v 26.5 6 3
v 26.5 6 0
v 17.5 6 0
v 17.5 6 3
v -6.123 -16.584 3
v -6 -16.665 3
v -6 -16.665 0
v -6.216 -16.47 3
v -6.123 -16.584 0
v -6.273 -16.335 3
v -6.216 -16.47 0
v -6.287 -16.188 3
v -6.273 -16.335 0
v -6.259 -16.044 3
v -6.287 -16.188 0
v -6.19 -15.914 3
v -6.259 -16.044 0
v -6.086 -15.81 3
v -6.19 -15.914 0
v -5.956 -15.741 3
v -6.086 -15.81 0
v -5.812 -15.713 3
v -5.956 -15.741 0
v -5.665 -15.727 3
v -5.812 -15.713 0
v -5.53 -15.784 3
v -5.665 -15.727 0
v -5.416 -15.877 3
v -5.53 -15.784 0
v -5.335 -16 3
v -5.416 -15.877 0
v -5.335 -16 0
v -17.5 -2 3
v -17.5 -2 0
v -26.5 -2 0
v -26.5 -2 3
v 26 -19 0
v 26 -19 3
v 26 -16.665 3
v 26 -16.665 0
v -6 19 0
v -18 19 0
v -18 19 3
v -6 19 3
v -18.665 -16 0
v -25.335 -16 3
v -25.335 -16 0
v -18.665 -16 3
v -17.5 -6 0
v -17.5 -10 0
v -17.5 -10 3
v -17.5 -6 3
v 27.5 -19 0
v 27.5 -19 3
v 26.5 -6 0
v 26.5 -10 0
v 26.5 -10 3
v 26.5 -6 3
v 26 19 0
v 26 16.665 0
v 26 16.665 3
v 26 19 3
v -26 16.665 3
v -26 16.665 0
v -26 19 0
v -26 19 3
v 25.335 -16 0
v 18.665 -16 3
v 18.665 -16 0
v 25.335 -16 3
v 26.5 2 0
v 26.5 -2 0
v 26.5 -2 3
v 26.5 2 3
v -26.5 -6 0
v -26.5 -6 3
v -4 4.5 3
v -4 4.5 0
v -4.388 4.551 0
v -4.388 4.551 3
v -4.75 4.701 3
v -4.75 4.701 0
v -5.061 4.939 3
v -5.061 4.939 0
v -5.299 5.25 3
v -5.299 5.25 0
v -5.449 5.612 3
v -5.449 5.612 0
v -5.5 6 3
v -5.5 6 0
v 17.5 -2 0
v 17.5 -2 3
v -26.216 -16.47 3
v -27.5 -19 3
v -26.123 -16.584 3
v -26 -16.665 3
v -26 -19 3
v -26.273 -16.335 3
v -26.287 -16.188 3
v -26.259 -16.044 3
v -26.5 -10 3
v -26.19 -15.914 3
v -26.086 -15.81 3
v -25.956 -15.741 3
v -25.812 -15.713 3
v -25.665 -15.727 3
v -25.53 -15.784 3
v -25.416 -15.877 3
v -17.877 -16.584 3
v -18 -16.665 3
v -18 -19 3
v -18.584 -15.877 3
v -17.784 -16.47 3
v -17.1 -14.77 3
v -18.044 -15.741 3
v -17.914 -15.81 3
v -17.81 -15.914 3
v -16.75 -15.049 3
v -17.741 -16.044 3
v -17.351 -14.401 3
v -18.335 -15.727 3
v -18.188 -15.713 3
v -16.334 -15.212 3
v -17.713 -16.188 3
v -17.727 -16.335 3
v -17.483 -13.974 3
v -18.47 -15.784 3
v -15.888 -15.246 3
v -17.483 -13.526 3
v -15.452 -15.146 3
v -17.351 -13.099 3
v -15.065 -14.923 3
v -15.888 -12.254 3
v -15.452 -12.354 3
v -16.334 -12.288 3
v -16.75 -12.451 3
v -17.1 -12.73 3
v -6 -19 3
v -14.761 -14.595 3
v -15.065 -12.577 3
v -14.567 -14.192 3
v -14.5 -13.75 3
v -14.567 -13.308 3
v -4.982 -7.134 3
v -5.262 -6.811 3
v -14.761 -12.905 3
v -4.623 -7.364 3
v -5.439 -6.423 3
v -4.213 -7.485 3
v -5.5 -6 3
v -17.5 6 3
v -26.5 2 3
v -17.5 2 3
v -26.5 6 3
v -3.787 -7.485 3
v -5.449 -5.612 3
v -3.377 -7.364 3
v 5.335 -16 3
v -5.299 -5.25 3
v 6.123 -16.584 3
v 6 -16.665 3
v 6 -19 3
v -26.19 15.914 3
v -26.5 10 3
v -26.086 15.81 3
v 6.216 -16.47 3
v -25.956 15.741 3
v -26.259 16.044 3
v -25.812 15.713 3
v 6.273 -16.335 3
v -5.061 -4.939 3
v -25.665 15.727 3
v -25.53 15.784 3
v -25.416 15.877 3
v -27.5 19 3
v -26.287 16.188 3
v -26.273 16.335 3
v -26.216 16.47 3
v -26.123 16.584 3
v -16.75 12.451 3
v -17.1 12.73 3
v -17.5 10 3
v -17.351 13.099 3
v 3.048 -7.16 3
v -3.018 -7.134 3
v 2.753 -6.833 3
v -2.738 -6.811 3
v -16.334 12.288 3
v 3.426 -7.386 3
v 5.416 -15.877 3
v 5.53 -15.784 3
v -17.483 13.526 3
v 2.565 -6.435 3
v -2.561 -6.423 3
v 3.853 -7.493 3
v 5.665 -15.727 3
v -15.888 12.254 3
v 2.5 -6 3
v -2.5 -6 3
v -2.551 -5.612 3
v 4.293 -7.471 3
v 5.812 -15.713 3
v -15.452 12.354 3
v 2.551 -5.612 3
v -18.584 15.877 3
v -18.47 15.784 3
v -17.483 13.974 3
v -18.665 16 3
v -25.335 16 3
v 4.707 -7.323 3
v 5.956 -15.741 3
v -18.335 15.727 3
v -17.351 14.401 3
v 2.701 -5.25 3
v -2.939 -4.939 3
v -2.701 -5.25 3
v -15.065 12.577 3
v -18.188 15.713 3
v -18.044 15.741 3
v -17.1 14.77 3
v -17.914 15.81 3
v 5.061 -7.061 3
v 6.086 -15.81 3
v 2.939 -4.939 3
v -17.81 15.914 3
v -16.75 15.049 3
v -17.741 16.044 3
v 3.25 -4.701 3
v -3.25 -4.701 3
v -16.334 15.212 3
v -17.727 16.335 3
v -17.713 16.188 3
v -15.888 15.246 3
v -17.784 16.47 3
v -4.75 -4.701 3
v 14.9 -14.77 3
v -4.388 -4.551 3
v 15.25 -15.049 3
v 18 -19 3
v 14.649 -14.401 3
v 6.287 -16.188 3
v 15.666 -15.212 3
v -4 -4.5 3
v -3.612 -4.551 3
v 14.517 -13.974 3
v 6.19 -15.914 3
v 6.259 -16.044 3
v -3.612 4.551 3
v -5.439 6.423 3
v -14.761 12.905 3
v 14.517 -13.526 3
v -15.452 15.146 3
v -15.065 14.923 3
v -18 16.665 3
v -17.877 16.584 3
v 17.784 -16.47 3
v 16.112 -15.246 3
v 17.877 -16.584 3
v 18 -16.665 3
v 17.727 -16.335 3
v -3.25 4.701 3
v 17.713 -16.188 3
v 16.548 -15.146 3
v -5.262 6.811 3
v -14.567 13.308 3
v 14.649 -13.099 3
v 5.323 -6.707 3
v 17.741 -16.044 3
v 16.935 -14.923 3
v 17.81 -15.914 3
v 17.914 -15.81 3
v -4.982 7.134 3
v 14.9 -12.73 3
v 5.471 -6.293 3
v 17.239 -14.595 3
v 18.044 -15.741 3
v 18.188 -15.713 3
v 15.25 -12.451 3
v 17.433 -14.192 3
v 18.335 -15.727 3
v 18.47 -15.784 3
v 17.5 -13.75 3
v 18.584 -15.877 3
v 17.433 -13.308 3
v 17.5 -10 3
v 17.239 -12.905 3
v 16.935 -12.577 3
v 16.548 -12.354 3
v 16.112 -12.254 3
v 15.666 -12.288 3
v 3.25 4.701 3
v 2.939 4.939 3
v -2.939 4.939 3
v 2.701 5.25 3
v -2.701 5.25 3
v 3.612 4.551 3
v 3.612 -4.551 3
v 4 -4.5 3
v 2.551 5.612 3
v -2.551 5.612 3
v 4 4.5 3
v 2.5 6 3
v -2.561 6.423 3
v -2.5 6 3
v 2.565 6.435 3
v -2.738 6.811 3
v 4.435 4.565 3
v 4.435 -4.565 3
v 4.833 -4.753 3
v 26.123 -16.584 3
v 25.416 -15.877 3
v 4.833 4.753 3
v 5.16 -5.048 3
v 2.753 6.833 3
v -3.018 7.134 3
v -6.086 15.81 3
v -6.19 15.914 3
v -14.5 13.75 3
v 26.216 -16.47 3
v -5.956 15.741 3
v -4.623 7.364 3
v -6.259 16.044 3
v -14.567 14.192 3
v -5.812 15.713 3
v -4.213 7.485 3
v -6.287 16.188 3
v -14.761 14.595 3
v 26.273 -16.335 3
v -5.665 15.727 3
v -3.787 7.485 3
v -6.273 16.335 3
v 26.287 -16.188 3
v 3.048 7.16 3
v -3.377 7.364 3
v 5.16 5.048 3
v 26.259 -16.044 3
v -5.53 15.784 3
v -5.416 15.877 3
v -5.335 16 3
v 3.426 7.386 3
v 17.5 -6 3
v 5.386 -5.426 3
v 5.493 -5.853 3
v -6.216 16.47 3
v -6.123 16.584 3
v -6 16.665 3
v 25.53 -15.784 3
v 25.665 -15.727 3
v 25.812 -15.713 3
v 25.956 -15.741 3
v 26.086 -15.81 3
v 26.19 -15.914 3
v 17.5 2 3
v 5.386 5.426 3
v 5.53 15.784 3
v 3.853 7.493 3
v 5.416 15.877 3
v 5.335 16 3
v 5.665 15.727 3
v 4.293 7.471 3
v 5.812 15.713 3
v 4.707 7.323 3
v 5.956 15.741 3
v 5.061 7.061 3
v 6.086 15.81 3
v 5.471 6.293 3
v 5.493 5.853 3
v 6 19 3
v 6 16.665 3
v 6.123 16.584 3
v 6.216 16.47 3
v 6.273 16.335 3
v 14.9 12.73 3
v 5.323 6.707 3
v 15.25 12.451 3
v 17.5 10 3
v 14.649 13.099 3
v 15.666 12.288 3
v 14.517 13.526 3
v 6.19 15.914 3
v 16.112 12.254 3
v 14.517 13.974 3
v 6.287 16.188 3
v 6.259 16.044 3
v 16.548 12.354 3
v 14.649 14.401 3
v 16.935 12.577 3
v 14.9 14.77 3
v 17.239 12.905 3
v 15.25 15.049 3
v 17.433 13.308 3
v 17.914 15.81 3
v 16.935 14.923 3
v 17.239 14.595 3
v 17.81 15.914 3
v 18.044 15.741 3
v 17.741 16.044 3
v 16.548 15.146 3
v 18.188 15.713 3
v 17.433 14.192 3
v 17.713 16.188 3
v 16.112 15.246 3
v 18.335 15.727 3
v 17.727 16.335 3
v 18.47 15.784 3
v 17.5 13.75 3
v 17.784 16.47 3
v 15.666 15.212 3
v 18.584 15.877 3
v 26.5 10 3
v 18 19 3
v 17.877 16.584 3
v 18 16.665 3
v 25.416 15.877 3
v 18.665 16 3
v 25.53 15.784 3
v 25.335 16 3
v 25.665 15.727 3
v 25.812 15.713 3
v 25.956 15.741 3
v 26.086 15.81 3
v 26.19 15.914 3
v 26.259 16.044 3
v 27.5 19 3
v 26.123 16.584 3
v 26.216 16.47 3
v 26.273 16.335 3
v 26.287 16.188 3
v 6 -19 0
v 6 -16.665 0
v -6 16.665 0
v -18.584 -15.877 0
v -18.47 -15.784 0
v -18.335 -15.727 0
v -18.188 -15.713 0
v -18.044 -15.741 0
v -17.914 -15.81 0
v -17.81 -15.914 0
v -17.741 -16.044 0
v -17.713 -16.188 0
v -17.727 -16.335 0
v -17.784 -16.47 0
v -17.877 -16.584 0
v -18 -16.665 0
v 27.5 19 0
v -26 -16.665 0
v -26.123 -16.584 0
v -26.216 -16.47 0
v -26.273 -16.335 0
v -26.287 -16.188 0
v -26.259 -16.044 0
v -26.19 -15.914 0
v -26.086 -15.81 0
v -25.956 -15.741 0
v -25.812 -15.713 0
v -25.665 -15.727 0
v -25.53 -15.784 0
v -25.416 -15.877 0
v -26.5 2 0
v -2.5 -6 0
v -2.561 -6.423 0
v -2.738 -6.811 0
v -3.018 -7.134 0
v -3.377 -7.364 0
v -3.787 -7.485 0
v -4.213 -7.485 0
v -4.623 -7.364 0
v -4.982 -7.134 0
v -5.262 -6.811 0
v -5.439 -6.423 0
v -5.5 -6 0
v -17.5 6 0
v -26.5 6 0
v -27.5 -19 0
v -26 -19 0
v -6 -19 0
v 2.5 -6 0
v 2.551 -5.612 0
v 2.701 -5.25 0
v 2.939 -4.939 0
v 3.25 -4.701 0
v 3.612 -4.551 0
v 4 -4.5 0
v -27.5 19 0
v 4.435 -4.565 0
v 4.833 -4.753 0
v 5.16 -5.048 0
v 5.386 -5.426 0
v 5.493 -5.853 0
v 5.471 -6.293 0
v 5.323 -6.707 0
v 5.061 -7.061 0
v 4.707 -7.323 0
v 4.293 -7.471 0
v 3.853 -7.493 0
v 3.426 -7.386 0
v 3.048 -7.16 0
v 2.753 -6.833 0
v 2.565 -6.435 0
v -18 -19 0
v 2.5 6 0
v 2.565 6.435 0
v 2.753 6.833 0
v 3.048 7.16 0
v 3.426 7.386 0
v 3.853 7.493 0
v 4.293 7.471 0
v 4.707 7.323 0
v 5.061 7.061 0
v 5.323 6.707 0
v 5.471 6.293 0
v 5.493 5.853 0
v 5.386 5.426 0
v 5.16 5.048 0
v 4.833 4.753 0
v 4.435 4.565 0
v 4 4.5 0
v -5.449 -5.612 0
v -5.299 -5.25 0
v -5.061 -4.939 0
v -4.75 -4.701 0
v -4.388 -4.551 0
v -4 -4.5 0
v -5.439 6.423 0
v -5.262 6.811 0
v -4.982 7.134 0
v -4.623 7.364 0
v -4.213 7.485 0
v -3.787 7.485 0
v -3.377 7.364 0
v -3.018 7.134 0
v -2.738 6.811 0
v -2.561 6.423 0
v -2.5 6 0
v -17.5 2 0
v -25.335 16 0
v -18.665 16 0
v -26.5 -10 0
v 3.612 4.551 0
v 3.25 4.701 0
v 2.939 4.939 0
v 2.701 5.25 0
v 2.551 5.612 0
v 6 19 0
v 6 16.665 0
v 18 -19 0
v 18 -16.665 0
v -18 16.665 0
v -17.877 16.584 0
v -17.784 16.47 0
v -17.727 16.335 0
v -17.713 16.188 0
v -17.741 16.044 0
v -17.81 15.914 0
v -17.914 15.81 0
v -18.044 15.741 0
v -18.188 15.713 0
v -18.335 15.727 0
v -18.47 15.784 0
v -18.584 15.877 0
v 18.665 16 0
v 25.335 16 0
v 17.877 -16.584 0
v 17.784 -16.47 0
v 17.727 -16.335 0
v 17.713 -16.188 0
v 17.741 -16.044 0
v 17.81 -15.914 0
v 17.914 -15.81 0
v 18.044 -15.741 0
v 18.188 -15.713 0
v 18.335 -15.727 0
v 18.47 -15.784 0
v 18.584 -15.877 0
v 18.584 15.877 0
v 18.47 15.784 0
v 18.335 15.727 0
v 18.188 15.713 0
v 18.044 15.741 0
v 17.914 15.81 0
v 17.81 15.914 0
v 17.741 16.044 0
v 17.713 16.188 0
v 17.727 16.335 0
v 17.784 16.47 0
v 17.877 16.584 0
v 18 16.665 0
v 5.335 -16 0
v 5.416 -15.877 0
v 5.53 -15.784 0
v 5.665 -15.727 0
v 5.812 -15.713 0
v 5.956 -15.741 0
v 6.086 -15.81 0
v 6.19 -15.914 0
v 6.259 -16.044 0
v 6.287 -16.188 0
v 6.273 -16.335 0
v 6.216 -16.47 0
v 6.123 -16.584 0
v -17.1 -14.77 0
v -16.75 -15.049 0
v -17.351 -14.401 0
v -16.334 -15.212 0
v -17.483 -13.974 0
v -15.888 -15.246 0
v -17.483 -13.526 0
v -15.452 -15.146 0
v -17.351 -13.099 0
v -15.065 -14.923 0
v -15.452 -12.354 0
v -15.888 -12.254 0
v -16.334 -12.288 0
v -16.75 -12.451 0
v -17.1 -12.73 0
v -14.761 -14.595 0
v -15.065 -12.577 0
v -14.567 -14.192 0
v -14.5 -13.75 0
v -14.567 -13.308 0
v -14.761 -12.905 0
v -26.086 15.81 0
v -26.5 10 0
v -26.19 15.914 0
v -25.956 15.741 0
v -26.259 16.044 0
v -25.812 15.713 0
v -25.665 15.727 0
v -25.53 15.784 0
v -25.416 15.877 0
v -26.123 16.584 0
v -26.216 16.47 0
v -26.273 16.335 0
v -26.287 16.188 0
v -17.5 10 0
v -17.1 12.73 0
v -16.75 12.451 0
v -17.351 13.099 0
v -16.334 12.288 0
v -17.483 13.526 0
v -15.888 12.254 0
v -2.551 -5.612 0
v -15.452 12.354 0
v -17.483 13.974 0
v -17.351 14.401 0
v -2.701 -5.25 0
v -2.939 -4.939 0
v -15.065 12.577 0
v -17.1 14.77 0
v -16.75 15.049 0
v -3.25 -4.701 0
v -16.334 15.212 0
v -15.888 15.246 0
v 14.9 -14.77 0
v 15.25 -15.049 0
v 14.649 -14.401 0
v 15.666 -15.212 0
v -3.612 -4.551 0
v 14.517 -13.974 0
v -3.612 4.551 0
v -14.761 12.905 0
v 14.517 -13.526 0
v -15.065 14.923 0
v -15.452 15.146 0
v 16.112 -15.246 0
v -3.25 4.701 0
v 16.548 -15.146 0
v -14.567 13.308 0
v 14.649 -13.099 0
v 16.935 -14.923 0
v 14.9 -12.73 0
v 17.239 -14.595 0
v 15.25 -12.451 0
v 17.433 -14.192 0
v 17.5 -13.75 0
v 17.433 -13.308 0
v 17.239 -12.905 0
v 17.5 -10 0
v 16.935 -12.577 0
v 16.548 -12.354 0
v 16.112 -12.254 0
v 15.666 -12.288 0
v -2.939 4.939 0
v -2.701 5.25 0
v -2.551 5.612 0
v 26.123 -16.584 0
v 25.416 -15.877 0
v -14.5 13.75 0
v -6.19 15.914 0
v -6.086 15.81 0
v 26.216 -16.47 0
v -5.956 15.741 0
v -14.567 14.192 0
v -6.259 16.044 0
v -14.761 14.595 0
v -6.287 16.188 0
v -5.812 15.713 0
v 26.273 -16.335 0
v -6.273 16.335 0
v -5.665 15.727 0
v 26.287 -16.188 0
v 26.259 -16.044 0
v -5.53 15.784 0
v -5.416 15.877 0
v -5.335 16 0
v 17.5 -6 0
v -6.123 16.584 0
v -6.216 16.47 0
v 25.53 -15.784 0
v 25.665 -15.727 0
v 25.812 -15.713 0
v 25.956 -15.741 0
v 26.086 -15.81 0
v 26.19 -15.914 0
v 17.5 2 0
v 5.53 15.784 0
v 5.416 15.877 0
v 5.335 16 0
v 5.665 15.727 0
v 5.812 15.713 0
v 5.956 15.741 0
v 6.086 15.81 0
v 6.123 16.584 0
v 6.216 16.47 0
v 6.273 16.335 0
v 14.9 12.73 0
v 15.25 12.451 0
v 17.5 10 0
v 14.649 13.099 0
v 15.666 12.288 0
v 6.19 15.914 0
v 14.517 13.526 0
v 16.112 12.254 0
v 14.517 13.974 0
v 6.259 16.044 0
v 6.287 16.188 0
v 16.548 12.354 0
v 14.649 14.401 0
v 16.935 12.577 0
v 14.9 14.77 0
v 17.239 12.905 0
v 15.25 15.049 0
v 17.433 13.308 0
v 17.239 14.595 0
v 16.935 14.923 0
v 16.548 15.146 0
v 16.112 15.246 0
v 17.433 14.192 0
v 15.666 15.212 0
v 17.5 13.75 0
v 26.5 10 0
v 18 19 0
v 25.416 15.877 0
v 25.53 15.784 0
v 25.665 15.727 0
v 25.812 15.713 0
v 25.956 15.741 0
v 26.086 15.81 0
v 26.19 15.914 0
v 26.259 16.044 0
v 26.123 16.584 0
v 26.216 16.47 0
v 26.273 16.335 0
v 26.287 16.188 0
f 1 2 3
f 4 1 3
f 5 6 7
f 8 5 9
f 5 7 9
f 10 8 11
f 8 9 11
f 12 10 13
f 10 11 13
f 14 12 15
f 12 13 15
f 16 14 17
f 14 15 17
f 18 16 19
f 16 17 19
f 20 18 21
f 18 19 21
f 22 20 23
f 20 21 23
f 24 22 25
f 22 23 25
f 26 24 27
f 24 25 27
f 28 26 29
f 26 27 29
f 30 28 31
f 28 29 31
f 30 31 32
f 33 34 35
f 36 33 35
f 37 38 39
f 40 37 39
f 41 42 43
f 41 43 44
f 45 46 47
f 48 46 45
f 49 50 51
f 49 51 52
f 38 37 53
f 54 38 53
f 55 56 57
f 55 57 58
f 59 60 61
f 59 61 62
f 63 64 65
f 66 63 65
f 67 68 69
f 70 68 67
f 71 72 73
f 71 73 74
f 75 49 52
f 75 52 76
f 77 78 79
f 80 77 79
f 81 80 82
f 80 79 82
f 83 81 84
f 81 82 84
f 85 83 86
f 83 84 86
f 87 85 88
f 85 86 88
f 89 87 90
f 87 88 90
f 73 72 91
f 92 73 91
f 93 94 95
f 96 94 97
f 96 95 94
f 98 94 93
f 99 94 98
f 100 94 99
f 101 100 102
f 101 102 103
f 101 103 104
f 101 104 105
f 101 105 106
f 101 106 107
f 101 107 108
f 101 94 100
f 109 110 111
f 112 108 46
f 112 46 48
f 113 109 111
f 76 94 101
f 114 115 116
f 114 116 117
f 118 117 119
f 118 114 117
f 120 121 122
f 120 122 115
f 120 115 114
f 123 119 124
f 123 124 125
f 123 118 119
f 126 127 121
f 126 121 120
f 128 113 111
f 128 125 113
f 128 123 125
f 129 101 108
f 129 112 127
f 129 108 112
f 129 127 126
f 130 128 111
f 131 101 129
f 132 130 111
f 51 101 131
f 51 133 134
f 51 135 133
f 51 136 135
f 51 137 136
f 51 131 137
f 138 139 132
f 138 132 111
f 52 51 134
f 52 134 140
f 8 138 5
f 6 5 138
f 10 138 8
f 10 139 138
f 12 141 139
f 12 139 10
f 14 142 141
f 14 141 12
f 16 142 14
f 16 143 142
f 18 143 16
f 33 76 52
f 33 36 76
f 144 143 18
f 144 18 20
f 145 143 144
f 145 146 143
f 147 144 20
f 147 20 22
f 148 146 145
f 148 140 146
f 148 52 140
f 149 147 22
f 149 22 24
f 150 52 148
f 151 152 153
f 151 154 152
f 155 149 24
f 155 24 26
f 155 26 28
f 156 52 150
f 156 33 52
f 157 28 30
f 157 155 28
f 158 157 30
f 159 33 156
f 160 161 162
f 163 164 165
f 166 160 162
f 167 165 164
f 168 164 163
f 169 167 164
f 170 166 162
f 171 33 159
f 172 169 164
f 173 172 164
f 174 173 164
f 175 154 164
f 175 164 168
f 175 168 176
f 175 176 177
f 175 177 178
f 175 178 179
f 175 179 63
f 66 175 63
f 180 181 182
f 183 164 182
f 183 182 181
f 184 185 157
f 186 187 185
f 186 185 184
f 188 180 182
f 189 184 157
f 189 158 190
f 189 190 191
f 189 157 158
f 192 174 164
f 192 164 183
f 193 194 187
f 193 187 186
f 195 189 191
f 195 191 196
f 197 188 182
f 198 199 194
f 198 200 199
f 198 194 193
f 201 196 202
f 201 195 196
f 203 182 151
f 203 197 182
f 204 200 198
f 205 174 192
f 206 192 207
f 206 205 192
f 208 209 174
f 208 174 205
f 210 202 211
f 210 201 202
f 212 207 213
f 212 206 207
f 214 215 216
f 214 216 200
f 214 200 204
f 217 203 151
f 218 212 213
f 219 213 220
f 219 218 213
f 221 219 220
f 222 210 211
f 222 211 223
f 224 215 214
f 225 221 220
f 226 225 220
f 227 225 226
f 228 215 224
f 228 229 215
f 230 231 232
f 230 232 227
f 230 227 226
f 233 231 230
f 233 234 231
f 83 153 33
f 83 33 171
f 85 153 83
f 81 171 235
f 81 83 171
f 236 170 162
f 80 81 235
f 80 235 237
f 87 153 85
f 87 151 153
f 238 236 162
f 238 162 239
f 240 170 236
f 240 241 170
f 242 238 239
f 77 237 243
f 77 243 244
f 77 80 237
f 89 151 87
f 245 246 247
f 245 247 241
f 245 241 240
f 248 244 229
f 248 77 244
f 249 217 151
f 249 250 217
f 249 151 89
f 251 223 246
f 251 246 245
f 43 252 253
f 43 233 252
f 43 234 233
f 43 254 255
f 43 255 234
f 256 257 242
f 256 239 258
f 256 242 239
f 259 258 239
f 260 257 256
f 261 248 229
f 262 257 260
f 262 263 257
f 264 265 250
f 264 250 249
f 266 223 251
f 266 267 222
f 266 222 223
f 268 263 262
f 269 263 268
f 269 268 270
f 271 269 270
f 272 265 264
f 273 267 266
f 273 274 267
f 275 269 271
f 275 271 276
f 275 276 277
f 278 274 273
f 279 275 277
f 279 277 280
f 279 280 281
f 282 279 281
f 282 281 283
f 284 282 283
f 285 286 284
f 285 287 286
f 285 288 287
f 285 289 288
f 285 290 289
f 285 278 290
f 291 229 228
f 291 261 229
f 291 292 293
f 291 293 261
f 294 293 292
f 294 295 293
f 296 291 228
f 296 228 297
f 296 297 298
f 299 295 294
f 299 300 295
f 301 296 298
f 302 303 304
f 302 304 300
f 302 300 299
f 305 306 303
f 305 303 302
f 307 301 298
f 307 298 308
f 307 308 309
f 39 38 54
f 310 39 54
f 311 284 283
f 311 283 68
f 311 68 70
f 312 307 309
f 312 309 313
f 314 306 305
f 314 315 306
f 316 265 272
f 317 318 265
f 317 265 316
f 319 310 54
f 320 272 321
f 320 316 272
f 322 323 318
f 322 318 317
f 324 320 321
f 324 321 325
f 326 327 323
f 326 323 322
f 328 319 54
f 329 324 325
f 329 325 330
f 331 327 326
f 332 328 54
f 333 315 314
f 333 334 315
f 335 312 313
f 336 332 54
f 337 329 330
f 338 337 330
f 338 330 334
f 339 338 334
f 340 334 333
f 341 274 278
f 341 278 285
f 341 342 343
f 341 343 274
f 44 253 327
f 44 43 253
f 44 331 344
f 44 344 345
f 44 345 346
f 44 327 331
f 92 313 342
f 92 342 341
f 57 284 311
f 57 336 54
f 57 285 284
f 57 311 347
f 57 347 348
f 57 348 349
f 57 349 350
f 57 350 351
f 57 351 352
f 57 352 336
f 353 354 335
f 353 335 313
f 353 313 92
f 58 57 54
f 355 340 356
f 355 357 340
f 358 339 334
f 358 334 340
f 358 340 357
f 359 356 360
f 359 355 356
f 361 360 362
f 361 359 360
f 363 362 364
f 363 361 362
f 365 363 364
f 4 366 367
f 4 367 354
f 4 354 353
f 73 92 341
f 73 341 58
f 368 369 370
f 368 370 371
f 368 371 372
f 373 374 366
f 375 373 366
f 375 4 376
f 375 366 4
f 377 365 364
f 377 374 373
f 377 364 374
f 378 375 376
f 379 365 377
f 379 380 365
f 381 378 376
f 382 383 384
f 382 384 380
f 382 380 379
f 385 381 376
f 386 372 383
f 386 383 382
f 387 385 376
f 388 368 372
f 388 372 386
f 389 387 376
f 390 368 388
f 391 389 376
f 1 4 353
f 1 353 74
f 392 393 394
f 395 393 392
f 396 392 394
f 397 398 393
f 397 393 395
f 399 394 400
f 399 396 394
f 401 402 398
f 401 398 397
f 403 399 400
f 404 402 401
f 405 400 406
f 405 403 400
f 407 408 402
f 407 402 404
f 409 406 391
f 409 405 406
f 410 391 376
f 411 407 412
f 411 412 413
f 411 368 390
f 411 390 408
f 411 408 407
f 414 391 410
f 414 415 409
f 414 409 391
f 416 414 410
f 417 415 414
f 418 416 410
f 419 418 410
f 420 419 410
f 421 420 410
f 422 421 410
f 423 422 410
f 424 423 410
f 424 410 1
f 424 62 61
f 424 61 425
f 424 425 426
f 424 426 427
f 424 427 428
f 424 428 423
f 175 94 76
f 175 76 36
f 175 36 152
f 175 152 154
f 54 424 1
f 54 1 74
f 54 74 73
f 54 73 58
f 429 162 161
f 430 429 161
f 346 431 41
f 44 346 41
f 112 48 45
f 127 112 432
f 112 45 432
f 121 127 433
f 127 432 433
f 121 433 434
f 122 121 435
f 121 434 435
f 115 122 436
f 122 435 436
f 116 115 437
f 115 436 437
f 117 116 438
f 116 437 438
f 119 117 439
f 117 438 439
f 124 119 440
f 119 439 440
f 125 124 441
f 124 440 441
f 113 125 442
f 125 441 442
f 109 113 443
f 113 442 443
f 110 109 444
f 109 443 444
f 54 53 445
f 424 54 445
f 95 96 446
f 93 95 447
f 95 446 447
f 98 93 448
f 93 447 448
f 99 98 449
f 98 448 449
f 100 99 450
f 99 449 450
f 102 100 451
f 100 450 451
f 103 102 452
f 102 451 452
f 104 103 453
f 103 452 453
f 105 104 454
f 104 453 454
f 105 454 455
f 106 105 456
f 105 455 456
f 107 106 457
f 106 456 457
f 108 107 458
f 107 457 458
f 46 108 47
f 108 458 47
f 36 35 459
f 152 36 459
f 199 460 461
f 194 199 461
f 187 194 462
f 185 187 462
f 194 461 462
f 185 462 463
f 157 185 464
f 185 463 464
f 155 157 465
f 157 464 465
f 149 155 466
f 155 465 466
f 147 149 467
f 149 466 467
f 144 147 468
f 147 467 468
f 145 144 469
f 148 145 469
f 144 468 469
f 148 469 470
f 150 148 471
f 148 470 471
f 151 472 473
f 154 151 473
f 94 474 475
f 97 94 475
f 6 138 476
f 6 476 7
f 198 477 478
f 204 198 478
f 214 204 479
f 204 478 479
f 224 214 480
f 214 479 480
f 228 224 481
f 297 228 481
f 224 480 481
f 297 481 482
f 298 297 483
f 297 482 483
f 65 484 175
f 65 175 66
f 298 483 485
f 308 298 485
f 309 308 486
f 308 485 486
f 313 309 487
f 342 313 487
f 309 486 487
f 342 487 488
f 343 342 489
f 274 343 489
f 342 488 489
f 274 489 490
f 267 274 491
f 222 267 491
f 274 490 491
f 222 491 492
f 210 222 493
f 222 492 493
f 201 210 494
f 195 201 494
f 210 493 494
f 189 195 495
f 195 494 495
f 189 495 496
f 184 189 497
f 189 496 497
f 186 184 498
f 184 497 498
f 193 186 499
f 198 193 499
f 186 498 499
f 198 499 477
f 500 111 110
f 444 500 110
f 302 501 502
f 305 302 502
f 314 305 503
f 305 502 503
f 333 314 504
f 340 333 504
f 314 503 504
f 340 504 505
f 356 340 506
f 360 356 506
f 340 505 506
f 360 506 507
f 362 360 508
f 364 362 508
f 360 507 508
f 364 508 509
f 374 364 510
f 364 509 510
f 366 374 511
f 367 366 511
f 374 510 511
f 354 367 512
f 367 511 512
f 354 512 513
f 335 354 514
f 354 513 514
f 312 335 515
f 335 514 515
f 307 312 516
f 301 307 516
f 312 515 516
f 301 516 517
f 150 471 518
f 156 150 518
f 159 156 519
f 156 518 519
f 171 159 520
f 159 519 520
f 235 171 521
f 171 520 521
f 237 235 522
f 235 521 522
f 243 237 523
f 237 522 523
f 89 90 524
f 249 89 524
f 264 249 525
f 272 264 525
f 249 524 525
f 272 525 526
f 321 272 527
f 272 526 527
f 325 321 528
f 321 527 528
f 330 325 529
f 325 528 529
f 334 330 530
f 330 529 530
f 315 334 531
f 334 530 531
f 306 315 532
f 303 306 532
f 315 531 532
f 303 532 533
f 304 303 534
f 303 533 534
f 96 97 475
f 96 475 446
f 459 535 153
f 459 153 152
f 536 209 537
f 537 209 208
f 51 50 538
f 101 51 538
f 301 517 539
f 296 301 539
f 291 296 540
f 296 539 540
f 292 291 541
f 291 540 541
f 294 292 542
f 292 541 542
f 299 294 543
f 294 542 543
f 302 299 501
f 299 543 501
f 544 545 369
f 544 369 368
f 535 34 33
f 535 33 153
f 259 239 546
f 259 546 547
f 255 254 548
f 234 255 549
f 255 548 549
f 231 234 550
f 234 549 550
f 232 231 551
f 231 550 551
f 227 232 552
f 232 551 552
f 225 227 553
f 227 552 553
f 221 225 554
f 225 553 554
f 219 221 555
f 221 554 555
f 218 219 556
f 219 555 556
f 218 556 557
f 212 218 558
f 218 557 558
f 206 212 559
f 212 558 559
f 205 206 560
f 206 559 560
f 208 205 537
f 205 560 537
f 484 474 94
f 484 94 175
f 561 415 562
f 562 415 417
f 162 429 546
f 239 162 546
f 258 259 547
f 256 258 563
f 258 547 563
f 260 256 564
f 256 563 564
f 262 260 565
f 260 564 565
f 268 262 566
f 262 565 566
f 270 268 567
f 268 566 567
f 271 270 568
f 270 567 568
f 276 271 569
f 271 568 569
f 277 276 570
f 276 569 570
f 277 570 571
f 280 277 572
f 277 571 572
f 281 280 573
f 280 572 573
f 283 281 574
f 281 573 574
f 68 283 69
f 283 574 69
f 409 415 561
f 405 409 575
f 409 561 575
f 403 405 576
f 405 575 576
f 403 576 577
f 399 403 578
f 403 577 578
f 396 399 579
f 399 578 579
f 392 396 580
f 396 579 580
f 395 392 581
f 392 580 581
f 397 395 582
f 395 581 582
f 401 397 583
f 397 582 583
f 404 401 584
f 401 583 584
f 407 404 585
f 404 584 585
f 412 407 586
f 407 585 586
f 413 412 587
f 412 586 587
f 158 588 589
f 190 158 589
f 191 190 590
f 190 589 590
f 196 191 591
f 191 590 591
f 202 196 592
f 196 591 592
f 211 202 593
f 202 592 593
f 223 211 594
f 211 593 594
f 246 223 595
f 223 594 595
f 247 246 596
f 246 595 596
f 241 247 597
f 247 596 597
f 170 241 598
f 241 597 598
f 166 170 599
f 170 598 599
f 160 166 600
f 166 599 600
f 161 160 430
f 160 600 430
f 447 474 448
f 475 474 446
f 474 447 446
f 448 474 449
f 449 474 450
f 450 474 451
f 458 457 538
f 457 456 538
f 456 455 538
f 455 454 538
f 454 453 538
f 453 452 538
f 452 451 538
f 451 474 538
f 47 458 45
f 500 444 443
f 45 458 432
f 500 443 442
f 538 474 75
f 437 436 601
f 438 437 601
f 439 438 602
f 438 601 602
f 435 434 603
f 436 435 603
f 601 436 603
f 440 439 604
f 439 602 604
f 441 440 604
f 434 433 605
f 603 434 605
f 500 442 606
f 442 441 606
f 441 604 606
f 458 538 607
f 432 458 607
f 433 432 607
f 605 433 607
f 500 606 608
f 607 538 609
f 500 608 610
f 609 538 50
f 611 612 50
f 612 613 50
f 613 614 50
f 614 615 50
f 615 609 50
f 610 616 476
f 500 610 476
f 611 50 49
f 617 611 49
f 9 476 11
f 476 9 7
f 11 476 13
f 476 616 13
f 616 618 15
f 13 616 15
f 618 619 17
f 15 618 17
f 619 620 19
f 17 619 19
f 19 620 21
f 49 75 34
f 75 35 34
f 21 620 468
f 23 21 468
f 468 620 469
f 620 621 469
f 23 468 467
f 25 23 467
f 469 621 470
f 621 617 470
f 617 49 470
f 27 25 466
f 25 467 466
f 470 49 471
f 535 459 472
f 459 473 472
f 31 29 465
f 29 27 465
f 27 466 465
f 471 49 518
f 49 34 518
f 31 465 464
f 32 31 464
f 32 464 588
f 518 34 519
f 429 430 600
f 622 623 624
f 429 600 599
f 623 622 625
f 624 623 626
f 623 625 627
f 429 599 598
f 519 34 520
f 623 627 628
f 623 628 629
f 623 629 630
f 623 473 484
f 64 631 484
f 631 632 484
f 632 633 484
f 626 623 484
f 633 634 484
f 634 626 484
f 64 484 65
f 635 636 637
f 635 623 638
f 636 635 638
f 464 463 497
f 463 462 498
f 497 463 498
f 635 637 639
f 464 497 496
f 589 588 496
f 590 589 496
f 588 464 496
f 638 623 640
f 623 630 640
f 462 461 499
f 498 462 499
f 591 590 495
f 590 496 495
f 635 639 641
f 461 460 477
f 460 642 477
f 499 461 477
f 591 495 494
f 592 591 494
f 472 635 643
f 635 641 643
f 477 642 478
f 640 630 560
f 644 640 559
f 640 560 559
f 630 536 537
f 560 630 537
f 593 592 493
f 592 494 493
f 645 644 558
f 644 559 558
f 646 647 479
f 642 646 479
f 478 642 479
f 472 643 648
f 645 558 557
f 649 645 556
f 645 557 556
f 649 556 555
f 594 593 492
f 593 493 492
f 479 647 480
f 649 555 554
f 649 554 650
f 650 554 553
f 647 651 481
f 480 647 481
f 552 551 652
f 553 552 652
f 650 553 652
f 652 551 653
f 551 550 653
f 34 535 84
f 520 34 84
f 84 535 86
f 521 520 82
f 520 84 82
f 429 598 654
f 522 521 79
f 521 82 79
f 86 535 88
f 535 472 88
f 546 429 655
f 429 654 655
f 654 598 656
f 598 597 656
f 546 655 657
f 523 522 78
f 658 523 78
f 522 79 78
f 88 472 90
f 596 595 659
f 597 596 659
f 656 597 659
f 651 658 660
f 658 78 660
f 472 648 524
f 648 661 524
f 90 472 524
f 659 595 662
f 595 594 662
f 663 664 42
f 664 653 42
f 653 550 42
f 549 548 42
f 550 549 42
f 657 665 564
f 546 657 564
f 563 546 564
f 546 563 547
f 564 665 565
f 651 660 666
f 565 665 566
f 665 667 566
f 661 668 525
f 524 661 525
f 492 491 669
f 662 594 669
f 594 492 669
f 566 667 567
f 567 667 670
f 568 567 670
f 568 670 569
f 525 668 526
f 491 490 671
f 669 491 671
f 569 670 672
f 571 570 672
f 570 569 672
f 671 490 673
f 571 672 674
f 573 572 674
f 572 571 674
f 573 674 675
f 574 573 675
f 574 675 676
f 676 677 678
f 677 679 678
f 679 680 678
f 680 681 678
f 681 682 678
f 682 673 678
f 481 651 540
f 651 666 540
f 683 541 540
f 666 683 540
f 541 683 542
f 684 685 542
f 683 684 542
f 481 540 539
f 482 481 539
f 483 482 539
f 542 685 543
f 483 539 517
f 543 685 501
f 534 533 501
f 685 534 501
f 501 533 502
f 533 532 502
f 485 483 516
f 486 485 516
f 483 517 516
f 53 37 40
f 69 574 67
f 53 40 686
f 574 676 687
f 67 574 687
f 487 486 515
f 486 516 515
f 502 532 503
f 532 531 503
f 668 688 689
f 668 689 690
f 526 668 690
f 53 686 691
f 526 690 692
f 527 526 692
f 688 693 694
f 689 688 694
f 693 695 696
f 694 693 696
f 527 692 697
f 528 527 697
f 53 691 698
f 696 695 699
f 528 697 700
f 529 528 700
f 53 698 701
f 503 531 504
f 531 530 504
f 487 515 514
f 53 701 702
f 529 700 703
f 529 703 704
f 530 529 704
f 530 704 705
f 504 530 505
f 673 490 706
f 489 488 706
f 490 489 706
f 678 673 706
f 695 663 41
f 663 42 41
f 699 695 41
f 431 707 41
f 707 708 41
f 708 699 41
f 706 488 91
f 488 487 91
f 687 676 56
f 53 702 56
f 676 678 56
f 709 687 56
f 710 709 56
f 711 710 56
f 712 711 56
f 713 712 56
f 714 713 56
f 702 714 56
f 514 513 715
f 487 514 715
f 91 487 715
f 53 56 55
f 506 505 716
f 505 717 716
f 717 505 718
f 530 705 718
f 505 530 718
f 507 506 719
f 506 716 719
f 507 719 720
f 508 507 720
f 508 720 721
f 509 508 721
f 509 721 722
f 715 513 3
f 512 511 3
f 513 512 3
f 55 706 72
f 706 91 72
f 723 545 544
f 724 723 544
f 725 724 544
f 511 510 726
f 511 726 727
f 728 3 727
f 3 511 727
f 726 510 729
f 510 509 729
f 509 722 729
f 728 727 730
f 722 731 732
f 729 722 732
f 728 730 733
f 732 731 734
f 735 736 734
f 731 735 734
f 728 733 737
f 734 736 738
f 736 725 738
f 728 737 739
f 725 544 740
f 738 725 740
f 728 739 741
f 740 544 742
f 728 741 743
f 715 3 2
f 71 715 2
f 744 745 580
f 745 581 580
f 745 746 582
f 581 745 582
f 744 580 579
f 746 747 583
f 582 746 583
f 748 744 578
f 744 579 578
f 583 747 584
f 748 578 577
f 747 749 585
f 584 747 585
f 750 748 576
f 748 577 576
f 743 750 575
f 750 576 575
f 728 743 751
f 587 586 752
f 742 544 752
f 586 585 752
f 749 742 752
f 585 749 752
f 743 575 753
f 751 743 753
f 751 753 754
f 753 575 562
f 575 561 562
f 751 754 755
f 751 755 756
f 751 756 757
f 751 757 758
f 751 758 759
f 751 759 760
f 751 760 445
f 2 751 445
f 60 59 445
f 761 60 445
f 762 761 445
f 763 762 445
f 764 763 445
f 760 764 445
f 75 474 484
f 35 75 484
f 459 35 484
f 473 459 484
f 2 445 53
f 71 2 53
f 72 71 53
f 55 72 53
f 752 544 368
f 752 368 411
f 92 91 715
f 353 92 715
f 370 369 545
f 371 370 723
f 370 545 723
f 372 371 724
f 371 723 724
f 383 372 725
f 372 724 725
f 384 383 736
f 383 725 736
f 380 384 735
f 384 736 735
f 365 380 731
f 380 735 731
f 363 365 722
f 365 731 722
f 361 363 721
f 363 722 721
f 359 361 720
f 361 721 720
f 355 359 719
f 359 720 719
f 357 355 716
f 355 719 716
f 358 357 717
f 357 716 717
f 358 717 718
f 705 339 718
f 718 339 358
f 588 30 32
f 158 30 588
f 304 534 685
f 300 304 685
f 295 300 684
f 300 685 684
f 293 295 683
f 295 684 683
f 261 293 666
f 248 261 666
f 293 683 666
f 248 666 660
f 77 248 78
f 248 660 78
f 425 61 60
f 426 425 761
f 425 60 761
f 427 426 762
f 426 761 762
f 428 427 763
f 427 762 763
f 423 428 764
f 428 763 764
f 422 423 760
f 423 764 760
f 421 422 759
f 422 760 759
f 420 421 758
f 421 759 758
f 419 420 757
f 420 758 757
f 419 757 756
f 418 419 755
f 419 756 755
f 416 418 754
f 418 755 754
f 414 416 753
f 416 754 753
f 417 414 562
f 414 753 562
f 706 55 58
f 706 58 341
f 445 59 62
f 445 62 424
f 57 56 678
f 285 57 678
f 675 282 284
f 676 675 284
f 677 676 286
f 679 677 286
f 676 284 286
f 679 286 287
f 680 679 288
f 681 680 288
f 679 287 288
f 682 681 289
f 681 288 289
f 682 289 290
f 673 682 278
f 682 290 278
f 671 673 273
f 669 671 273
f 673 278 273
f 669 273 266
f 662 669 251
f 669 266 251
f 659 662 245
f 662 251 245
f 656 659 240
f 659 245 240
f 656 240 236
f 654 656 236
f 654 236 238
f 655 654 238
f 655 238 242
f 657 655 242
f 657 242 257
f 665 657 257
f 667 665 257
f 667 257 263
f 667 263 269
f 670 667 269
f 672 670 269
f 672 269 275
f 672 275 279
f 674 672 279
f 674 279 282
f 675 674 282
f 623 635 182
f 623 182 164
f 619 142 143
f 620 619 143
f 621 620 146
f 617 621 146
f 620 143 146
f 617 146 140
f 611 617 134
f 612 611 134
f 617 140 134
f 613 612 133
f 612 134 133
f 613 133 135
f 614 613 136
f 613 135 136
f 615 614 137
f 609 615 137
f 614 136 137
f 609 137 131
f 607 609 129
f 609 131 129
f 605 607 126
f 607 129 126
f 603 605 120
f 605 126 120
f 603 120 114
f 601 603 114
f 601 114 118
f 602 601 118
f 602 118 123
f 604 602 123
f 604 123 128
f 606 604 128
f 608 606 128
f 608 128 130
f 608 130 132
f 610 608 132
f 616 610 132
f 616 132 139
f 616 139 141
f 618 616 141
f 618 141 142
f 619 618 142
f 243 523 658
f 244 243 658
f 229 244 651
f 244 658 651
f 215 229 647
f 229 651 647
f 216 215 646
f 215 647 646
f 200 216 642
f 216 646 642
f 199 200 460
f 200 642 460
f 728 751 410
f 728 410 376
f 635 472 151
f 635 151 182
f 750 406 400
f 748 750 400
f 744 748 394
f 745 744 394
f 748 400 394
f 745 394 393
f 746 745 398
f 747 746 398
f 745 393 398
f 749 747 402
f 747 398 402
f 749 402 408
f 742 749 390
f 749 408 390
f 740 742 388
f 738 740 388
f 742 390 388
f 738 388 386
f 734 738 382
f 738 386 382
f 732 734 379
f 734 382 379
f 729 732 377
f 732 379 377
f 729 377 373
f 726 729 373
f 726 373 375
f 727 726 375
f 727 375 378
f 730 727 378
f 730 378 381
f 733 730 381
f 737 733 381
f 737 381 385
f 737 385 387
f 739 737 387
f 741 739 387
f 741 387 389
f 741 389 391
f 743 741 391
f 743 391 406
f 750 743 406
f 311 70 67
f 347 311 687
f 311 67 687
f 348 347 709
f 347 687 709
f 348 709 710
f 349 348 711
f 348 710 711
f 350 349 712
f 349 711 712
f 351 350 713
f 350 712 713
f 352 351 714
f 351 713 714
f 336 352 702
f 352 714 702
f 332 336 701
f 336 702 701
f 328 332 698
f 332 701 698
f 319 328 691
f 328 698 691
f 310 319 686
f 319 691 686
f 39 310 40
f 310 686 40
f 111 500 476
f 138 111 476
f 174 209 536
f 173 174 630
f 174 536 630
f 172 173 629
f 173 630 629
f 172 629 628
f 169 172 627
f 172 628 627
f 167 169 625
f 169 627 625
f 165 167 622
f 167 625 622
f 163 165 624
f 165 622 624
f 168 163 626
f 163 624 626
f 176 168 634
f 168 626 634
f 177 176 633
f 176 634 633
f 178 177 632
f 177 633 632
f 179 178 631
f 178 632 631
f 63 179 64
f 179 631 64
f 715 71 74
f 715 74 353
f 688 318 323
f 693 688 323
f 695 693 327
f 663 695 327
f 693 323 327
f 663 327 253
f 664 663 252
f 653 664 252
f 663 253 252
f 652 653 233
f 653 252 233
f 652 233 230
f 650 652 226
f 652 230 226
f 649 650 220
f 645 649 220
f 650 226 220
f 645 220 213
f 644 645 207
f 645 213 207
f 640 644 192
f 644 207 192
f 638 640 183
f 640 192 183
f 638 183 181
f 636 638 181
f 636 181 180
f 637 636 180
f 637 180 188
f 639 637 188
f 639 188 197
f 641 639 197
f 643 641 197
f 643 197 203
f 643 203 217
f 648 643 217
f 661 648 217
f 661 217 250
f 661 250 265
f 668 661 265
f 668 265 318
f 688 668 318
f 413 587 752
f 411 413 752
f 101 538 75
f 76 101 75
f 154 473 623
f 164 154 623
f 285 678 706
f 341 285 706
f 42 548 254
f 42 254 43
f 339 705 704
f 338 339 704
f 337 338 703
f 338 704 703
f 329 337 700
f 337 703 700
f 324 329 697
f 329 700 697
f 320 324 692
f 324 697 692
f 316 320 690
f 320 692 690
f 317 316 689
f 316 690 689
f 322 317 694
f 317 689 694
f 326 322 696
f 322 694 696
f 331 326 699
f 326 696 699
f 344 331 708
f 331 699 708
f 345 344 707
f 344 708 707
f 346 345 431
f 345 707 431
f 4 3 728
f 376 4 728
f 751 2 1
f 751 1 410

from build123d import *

# Parameters (mm, degrees)
SKETCH_1_W          = 55
SKETCH_1_H          = 38
EXTRUDE_1_DEPTH     = 3
SKETCH_2_R          = 1.5
CUT_EXTRUDE_1_DEPTH = 30
SKETCH_3_W          = 8
SKETCH_3_H          = 3
CUT_EXTRUDE_2_DEPTH = 30
SKETCH_5_W          = 12
SKETCH_5_H          = 3
CUT_EXTRUDE_4_DEPTH = 10
SKETCH_6_W          = 9
SKETCH_6_H          = 4
CUT_EXTRUDE_5_DEPTH = 10
SKETCH_7_R          = 0.5
CUT_EXTRUDE_6_DEPTH = 10
CUT_EXTRUDE_7_DEPTH = 20


with BuildPart() as part:
    # 草图1 → 凸台-拉伸1 (new body)
    with BuildSketch(Plane.XY):
        Rectangle(SKETCH_1_W, SKETCH_1_H)
    extrude(amount=EXTRUDE_1_DEPTH)

    # 草图2 → 切除-拉伸1 (cut)
    with BuildSketch(Plane.XY.offset(3)):
        with Locations((16, 13.75)):
            Circle(SKETCH_2_R)
        with Locations((16, -13.75)):
            Circle(SKETCH_2_R)
        with Locations((-16, 13.75)):
            Circle(SKETCH_2_R)
        with Locations((-16, -13.75)):
            Circle(SKETCH_2_R)
    extrude(amount=-CUT_EXTRUDE_1_DEPTH, mode=Mode.SUBTRACT)

    # 草图3 → 切除-拉伸2 (cut)
    with BuildSketch(Plane.XY.offset(3)):
        with Locations((22, 17.5)):
            Rectangle(SKETCH_3_W, SKETCH_3_H)
        with Locations((22, -17.5)):
            Rectangle(SKETCH_3_W, SKETCH_3_H)
        with Locations((-22, 17.5)):
            Rectangle(SKETCH_3_W, SKETCH_3_H)
        with Locations((-22, -17.5)):
            Rectangle(SKETCH_3_W, SKETCH_3_H)
    extrude(amount=-CUT_EXTRUDE_2_DEPTH, mode=Mode.SUBTRACT)

    # 草图5 → 切除-拉伸4 (cut)
    with BuildSketch(Plane.XY.offset(3)):
        with Locations((0, -17.5)):
            Rectangle(SKETCH_5_W, SKETCH_5_H)
        with Locations((0, 17.5)):
            Rectangle(SKETCH_5_W, SKETCH_5_H)
    extrude(amount=-CUT_EXTRUDE_4_DEPTH, mode=Mode.SUBTRACT)

    # 草图6 → 切除-拉伸5 (cut)
    with BuildSketch(Plane(origin=(0, 0, 0), x_dir=(-1, 0, 0), z_dir=(0, 0, -1))):
        with Locations((-22, -8)):
            Rectangle(SKETCH_6_W, SKETCH_6_H)
        with Locations((-22, 0)):
            Rectangle(SKETCH_6_W, SKETCH_6_H)
        with Locations((-22, 8)):
            Rectangle(SKETCH_6_W, SKETCH_6_H)
        with Locations((22, -8)):
            Rectangle(SKETCH_6_W, SKETCH_6_H)
        with Locations((22, 0)):
            Rectangle(SKETCH_6_W, SKETCH_6_H)
        with Locations((22, 8)):
            Rectangle(SKETCH_6_W, SKETCH_6_H)
    extrude(amount=-CUT_EXTRUDE_5_DEPTH, mode=Mode.SUBTRACT)

    # 草图7 → 切除-拉伸6 (cut)
    with BuildSketch(Plane(origin=(0, 0, 0), x_dir=(-1, 0, 0), z_dir=(0, 0, -1))):
        with Locations((-18.212132034, -16.212132034)):
            Circle(SKETCH_7_R)
        with Locations((-25.787867966, -16.212132034)):
            Circle(SKETCH_7_R)
        with Locations((-25.787867966, 16.212132034)):
            Circle(SKETCH_7_R)
        with Locations((-18.212132034, 16.212132034)):
            Circle(SKETCH_7_R)
        with Locations((-5.787867966, -16.212132034)):
            Circle(SKETCH_7_R)
        with Locations((25.787867966, -16.212132034)):
            Circle(SKETCH_7_R)
        with Locations((18.212132034, -16.212132034)):
            Circle(SKETCH_7_R)
        with Locations((18.212132034, 16.212132034)):
            Circle(SKETCH_7_R)
        with Locations((25.787867966, 16.212132034)):
            Circle(SKETCH_7_R)
        with Locations((-5.787867966, 16.212132034)):
            Circle(SKETCH_7_R)
        with Locations((5.787867966, 16.212132034)):
            Circle(SKETCH_7_R)
        with Locations((5.787867966, -16.212132034)):
            Circle(SKETCH_7_R)
    extrude(amount=-CUT_EXTRUDE_6_DEPTH, mode=Mode.SUBTRACT)

    # 草图8 → 切除-拉伸7 (cut)
    with BuildSketch(Plane(origin=(0, 0, 0), x_dir=(-1, 0, 0), z_dir=(0, 0, -1))):
        with BuildLine():
            ThreePointArc((-2.5, 6), (-5.060660172, 7.060660172), (-4, 4.5))
            Line((-4, 4.5), (-4, 6))
            Line((-4, 6), (-2.5, 6))
        make_face()
        with BuildLine():
            Line((-4, 6), (-4, 4.5))
            ThreePointArc((-4, 4.5), (-2.939339828, 4.939339828), (-2.5, 6))
            Line((-2.5, 6), (-4, 6))
        make_face()
        with BuildLine():
            ThreePointArc((2.5, 6), (2.939339828, 4.939339828), (4, 4.5))
            Line((4, 4.5), (4, 6))
            Line((4, 6), (2.5, 6))
        make_face()
        with BuildLine():
            Line((4, 6), (4, 4.5))
            ThreePointArc((4, 4.5), (5.060660172, 4.939339828), (5.5, 6))
            ThreePointArc((5.5, 6), (4, 7.5), (2.5, 6))
            Line((2.5, 6), (4, 6))
        make_face()
        with BuildLine():
            ThreePointArc((5.5, -6), (5.060660172, -4.939339828), (4, -4.5))
            Line((4, -4.5), (4, -6))
            Line((4, -6), (2.5, -6))
            ThreePointArc((2.5, -6), (4, -7.5), (5.5, -6))
        make_face()
        with BuildLine():
            Line((4, -6), (4, -4.5))
            ThreePointArc((4, -4.5), (2.939339828, -4.939339828), (2.5, -6))
            Line((2.5, -6), (4, -6))
        make_face()
        with BuildLine():
            ThreePointArc((-2.5, -6), (-2.939339828, -4.939339828), (-4, -4.5))
            Line((-4, -4.5), (-4, -6))
            Line((-4, -6), (-2.5, -6))
        make_face()
        with BuildLine():
            Line((-4, -6), (-4, -4.5))
            ThreePointArc((-4, -4.5), (-5.060660172, -7.060660172), (-2.5, -6))
            Line((-2.5, -6), (-4, -6))
        make_face()
    extrude(amount=-CUT_EXTRUDE_7_DEPTH, mode=Mode.SUBTRACT)


solid = part.part
